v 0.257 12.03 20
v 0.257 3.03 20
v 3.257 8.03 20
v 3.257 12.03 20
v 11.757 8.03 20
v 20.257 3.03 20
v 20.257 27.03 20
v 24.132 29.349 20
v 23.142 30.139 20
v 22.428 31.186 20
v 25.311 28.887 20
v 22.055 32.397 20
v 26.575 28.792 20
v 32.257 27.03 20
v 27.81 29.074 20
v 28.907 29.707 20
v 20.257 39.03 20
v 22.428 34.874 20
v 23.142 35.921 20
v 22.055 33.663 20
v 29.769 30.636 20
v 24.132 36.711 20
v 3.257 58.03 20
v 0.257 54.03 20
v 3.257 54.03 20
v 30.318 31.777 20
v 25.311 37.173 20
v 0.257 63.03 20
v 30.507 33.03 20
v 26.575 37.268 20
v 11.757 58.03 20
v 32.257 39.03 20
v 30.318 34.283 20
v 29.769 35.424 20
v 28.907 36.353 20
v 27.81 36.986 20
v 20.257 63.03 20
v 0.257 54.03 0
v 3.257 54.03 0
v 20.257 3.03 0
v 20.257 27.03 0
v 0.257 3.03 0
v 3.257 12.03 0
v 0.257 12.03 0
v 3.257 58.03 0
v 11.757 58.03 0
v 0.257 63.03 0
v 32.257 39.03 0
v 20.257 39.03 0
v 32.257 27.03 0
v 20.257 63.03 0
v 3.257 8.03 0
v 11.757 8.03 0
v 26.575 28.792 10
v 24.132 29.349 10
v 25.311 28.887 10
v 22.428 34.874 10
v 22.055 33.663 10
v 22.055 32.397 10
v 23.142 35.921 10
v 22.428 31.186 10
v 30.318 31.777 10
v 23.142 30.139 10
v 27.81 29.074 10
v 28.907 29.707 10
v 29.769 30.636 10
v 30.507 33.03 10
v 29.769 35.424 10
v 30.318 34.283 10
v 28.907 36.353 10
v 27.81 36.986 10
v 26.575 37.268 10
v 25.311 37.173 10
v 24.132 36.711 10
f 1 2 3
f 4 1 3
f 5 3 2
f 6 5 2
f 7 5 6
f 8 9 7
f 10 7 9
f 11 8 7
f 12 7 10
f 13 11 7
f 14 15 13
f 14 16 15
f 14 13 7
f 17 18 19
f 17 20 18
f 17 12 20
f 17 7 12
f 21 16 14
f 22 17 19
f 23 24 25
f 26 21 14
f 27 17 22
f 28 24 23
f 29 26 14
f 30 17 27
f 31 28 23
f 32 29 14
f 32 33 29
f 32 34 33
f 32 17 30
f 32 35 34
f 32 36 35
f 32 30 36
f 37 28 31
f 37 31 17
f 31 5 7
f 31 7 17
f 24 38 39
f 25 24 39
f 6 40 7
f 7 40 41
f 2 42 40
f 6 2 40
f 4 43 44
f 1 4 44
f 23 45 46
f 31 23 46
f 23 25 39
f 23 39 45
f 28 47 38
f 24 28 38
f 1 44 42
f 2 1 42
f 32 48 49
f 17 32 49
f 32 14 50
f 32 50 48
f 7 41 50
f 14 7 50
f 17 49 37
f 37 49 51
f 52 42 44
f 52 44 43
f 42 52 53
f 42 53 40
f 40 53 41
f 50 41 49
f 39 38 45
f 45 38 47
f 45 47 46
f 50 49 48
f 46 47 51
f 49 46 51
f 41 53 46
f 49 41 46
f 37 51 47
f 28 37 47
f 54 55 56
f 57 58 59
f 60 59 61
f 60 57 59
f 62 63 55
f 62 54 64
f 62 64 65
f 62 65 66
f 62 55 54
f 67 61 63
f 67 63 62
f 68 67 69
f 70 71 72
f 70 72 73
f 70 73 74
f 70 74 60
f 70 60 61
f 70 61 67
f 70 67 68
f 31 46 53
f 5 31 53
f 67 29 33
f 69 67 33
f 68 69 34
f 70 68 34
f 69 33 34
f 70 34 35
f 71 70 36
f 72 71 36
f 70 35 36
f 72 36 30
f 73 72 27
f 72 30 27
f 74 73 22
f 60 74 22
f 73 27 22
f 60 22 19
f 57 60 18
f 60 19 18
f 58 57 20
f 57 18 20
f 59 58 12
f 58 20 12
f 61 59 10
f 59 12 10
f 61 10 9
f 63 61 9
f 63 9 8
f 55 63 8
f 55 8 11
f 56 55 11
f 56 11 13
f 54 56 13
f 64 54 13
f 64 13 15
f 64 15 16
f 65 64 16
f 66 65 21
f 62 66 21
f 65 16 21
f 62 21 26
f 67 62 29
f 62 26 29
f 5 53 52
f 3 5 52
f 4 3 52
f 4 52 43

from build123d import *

# Parameters (mm, degrees)
F1_DEPTH = 20
F2_R     = 4.25
F3_DEPTH = 10


with BuildPart() as f1:
    # F0 (on Top) → F1 (new body)
    with BuildSketch(Plane.XY):
        Polygon((3.257158, 63.029949), (0.257158, 63.029949), (0.257158, 54.029949), (3.257158, 54.029949), (3.257158, 58.029949), (11.757158, 58.029949), (11.757158, 8.029949), (3.257158, 8.029949), (3.257158, 12.029949), (0.257158, 12.029949), (0.257158, 3.029949), (3.257158, 3.029949), (20.257158, 3.029949), (20.257158, 27.029949), (32.257158, 27.029949), (32.257158, 39.029949), (20.257158, 39.029949), (20.257158, 63.029949), align=None)
    extrude(amount=F1_DEPTH)

    # F2 (on face) → F3 (cut)
    with BuildSketch(Plane.XY.offset(20)):
        with Locations((26.257158, 33.029949)):
            Circle(F2_R)
    extrude(amount=-F3_DEPTH, mode=Mode.SUBTRACT)


solid = f1.part
